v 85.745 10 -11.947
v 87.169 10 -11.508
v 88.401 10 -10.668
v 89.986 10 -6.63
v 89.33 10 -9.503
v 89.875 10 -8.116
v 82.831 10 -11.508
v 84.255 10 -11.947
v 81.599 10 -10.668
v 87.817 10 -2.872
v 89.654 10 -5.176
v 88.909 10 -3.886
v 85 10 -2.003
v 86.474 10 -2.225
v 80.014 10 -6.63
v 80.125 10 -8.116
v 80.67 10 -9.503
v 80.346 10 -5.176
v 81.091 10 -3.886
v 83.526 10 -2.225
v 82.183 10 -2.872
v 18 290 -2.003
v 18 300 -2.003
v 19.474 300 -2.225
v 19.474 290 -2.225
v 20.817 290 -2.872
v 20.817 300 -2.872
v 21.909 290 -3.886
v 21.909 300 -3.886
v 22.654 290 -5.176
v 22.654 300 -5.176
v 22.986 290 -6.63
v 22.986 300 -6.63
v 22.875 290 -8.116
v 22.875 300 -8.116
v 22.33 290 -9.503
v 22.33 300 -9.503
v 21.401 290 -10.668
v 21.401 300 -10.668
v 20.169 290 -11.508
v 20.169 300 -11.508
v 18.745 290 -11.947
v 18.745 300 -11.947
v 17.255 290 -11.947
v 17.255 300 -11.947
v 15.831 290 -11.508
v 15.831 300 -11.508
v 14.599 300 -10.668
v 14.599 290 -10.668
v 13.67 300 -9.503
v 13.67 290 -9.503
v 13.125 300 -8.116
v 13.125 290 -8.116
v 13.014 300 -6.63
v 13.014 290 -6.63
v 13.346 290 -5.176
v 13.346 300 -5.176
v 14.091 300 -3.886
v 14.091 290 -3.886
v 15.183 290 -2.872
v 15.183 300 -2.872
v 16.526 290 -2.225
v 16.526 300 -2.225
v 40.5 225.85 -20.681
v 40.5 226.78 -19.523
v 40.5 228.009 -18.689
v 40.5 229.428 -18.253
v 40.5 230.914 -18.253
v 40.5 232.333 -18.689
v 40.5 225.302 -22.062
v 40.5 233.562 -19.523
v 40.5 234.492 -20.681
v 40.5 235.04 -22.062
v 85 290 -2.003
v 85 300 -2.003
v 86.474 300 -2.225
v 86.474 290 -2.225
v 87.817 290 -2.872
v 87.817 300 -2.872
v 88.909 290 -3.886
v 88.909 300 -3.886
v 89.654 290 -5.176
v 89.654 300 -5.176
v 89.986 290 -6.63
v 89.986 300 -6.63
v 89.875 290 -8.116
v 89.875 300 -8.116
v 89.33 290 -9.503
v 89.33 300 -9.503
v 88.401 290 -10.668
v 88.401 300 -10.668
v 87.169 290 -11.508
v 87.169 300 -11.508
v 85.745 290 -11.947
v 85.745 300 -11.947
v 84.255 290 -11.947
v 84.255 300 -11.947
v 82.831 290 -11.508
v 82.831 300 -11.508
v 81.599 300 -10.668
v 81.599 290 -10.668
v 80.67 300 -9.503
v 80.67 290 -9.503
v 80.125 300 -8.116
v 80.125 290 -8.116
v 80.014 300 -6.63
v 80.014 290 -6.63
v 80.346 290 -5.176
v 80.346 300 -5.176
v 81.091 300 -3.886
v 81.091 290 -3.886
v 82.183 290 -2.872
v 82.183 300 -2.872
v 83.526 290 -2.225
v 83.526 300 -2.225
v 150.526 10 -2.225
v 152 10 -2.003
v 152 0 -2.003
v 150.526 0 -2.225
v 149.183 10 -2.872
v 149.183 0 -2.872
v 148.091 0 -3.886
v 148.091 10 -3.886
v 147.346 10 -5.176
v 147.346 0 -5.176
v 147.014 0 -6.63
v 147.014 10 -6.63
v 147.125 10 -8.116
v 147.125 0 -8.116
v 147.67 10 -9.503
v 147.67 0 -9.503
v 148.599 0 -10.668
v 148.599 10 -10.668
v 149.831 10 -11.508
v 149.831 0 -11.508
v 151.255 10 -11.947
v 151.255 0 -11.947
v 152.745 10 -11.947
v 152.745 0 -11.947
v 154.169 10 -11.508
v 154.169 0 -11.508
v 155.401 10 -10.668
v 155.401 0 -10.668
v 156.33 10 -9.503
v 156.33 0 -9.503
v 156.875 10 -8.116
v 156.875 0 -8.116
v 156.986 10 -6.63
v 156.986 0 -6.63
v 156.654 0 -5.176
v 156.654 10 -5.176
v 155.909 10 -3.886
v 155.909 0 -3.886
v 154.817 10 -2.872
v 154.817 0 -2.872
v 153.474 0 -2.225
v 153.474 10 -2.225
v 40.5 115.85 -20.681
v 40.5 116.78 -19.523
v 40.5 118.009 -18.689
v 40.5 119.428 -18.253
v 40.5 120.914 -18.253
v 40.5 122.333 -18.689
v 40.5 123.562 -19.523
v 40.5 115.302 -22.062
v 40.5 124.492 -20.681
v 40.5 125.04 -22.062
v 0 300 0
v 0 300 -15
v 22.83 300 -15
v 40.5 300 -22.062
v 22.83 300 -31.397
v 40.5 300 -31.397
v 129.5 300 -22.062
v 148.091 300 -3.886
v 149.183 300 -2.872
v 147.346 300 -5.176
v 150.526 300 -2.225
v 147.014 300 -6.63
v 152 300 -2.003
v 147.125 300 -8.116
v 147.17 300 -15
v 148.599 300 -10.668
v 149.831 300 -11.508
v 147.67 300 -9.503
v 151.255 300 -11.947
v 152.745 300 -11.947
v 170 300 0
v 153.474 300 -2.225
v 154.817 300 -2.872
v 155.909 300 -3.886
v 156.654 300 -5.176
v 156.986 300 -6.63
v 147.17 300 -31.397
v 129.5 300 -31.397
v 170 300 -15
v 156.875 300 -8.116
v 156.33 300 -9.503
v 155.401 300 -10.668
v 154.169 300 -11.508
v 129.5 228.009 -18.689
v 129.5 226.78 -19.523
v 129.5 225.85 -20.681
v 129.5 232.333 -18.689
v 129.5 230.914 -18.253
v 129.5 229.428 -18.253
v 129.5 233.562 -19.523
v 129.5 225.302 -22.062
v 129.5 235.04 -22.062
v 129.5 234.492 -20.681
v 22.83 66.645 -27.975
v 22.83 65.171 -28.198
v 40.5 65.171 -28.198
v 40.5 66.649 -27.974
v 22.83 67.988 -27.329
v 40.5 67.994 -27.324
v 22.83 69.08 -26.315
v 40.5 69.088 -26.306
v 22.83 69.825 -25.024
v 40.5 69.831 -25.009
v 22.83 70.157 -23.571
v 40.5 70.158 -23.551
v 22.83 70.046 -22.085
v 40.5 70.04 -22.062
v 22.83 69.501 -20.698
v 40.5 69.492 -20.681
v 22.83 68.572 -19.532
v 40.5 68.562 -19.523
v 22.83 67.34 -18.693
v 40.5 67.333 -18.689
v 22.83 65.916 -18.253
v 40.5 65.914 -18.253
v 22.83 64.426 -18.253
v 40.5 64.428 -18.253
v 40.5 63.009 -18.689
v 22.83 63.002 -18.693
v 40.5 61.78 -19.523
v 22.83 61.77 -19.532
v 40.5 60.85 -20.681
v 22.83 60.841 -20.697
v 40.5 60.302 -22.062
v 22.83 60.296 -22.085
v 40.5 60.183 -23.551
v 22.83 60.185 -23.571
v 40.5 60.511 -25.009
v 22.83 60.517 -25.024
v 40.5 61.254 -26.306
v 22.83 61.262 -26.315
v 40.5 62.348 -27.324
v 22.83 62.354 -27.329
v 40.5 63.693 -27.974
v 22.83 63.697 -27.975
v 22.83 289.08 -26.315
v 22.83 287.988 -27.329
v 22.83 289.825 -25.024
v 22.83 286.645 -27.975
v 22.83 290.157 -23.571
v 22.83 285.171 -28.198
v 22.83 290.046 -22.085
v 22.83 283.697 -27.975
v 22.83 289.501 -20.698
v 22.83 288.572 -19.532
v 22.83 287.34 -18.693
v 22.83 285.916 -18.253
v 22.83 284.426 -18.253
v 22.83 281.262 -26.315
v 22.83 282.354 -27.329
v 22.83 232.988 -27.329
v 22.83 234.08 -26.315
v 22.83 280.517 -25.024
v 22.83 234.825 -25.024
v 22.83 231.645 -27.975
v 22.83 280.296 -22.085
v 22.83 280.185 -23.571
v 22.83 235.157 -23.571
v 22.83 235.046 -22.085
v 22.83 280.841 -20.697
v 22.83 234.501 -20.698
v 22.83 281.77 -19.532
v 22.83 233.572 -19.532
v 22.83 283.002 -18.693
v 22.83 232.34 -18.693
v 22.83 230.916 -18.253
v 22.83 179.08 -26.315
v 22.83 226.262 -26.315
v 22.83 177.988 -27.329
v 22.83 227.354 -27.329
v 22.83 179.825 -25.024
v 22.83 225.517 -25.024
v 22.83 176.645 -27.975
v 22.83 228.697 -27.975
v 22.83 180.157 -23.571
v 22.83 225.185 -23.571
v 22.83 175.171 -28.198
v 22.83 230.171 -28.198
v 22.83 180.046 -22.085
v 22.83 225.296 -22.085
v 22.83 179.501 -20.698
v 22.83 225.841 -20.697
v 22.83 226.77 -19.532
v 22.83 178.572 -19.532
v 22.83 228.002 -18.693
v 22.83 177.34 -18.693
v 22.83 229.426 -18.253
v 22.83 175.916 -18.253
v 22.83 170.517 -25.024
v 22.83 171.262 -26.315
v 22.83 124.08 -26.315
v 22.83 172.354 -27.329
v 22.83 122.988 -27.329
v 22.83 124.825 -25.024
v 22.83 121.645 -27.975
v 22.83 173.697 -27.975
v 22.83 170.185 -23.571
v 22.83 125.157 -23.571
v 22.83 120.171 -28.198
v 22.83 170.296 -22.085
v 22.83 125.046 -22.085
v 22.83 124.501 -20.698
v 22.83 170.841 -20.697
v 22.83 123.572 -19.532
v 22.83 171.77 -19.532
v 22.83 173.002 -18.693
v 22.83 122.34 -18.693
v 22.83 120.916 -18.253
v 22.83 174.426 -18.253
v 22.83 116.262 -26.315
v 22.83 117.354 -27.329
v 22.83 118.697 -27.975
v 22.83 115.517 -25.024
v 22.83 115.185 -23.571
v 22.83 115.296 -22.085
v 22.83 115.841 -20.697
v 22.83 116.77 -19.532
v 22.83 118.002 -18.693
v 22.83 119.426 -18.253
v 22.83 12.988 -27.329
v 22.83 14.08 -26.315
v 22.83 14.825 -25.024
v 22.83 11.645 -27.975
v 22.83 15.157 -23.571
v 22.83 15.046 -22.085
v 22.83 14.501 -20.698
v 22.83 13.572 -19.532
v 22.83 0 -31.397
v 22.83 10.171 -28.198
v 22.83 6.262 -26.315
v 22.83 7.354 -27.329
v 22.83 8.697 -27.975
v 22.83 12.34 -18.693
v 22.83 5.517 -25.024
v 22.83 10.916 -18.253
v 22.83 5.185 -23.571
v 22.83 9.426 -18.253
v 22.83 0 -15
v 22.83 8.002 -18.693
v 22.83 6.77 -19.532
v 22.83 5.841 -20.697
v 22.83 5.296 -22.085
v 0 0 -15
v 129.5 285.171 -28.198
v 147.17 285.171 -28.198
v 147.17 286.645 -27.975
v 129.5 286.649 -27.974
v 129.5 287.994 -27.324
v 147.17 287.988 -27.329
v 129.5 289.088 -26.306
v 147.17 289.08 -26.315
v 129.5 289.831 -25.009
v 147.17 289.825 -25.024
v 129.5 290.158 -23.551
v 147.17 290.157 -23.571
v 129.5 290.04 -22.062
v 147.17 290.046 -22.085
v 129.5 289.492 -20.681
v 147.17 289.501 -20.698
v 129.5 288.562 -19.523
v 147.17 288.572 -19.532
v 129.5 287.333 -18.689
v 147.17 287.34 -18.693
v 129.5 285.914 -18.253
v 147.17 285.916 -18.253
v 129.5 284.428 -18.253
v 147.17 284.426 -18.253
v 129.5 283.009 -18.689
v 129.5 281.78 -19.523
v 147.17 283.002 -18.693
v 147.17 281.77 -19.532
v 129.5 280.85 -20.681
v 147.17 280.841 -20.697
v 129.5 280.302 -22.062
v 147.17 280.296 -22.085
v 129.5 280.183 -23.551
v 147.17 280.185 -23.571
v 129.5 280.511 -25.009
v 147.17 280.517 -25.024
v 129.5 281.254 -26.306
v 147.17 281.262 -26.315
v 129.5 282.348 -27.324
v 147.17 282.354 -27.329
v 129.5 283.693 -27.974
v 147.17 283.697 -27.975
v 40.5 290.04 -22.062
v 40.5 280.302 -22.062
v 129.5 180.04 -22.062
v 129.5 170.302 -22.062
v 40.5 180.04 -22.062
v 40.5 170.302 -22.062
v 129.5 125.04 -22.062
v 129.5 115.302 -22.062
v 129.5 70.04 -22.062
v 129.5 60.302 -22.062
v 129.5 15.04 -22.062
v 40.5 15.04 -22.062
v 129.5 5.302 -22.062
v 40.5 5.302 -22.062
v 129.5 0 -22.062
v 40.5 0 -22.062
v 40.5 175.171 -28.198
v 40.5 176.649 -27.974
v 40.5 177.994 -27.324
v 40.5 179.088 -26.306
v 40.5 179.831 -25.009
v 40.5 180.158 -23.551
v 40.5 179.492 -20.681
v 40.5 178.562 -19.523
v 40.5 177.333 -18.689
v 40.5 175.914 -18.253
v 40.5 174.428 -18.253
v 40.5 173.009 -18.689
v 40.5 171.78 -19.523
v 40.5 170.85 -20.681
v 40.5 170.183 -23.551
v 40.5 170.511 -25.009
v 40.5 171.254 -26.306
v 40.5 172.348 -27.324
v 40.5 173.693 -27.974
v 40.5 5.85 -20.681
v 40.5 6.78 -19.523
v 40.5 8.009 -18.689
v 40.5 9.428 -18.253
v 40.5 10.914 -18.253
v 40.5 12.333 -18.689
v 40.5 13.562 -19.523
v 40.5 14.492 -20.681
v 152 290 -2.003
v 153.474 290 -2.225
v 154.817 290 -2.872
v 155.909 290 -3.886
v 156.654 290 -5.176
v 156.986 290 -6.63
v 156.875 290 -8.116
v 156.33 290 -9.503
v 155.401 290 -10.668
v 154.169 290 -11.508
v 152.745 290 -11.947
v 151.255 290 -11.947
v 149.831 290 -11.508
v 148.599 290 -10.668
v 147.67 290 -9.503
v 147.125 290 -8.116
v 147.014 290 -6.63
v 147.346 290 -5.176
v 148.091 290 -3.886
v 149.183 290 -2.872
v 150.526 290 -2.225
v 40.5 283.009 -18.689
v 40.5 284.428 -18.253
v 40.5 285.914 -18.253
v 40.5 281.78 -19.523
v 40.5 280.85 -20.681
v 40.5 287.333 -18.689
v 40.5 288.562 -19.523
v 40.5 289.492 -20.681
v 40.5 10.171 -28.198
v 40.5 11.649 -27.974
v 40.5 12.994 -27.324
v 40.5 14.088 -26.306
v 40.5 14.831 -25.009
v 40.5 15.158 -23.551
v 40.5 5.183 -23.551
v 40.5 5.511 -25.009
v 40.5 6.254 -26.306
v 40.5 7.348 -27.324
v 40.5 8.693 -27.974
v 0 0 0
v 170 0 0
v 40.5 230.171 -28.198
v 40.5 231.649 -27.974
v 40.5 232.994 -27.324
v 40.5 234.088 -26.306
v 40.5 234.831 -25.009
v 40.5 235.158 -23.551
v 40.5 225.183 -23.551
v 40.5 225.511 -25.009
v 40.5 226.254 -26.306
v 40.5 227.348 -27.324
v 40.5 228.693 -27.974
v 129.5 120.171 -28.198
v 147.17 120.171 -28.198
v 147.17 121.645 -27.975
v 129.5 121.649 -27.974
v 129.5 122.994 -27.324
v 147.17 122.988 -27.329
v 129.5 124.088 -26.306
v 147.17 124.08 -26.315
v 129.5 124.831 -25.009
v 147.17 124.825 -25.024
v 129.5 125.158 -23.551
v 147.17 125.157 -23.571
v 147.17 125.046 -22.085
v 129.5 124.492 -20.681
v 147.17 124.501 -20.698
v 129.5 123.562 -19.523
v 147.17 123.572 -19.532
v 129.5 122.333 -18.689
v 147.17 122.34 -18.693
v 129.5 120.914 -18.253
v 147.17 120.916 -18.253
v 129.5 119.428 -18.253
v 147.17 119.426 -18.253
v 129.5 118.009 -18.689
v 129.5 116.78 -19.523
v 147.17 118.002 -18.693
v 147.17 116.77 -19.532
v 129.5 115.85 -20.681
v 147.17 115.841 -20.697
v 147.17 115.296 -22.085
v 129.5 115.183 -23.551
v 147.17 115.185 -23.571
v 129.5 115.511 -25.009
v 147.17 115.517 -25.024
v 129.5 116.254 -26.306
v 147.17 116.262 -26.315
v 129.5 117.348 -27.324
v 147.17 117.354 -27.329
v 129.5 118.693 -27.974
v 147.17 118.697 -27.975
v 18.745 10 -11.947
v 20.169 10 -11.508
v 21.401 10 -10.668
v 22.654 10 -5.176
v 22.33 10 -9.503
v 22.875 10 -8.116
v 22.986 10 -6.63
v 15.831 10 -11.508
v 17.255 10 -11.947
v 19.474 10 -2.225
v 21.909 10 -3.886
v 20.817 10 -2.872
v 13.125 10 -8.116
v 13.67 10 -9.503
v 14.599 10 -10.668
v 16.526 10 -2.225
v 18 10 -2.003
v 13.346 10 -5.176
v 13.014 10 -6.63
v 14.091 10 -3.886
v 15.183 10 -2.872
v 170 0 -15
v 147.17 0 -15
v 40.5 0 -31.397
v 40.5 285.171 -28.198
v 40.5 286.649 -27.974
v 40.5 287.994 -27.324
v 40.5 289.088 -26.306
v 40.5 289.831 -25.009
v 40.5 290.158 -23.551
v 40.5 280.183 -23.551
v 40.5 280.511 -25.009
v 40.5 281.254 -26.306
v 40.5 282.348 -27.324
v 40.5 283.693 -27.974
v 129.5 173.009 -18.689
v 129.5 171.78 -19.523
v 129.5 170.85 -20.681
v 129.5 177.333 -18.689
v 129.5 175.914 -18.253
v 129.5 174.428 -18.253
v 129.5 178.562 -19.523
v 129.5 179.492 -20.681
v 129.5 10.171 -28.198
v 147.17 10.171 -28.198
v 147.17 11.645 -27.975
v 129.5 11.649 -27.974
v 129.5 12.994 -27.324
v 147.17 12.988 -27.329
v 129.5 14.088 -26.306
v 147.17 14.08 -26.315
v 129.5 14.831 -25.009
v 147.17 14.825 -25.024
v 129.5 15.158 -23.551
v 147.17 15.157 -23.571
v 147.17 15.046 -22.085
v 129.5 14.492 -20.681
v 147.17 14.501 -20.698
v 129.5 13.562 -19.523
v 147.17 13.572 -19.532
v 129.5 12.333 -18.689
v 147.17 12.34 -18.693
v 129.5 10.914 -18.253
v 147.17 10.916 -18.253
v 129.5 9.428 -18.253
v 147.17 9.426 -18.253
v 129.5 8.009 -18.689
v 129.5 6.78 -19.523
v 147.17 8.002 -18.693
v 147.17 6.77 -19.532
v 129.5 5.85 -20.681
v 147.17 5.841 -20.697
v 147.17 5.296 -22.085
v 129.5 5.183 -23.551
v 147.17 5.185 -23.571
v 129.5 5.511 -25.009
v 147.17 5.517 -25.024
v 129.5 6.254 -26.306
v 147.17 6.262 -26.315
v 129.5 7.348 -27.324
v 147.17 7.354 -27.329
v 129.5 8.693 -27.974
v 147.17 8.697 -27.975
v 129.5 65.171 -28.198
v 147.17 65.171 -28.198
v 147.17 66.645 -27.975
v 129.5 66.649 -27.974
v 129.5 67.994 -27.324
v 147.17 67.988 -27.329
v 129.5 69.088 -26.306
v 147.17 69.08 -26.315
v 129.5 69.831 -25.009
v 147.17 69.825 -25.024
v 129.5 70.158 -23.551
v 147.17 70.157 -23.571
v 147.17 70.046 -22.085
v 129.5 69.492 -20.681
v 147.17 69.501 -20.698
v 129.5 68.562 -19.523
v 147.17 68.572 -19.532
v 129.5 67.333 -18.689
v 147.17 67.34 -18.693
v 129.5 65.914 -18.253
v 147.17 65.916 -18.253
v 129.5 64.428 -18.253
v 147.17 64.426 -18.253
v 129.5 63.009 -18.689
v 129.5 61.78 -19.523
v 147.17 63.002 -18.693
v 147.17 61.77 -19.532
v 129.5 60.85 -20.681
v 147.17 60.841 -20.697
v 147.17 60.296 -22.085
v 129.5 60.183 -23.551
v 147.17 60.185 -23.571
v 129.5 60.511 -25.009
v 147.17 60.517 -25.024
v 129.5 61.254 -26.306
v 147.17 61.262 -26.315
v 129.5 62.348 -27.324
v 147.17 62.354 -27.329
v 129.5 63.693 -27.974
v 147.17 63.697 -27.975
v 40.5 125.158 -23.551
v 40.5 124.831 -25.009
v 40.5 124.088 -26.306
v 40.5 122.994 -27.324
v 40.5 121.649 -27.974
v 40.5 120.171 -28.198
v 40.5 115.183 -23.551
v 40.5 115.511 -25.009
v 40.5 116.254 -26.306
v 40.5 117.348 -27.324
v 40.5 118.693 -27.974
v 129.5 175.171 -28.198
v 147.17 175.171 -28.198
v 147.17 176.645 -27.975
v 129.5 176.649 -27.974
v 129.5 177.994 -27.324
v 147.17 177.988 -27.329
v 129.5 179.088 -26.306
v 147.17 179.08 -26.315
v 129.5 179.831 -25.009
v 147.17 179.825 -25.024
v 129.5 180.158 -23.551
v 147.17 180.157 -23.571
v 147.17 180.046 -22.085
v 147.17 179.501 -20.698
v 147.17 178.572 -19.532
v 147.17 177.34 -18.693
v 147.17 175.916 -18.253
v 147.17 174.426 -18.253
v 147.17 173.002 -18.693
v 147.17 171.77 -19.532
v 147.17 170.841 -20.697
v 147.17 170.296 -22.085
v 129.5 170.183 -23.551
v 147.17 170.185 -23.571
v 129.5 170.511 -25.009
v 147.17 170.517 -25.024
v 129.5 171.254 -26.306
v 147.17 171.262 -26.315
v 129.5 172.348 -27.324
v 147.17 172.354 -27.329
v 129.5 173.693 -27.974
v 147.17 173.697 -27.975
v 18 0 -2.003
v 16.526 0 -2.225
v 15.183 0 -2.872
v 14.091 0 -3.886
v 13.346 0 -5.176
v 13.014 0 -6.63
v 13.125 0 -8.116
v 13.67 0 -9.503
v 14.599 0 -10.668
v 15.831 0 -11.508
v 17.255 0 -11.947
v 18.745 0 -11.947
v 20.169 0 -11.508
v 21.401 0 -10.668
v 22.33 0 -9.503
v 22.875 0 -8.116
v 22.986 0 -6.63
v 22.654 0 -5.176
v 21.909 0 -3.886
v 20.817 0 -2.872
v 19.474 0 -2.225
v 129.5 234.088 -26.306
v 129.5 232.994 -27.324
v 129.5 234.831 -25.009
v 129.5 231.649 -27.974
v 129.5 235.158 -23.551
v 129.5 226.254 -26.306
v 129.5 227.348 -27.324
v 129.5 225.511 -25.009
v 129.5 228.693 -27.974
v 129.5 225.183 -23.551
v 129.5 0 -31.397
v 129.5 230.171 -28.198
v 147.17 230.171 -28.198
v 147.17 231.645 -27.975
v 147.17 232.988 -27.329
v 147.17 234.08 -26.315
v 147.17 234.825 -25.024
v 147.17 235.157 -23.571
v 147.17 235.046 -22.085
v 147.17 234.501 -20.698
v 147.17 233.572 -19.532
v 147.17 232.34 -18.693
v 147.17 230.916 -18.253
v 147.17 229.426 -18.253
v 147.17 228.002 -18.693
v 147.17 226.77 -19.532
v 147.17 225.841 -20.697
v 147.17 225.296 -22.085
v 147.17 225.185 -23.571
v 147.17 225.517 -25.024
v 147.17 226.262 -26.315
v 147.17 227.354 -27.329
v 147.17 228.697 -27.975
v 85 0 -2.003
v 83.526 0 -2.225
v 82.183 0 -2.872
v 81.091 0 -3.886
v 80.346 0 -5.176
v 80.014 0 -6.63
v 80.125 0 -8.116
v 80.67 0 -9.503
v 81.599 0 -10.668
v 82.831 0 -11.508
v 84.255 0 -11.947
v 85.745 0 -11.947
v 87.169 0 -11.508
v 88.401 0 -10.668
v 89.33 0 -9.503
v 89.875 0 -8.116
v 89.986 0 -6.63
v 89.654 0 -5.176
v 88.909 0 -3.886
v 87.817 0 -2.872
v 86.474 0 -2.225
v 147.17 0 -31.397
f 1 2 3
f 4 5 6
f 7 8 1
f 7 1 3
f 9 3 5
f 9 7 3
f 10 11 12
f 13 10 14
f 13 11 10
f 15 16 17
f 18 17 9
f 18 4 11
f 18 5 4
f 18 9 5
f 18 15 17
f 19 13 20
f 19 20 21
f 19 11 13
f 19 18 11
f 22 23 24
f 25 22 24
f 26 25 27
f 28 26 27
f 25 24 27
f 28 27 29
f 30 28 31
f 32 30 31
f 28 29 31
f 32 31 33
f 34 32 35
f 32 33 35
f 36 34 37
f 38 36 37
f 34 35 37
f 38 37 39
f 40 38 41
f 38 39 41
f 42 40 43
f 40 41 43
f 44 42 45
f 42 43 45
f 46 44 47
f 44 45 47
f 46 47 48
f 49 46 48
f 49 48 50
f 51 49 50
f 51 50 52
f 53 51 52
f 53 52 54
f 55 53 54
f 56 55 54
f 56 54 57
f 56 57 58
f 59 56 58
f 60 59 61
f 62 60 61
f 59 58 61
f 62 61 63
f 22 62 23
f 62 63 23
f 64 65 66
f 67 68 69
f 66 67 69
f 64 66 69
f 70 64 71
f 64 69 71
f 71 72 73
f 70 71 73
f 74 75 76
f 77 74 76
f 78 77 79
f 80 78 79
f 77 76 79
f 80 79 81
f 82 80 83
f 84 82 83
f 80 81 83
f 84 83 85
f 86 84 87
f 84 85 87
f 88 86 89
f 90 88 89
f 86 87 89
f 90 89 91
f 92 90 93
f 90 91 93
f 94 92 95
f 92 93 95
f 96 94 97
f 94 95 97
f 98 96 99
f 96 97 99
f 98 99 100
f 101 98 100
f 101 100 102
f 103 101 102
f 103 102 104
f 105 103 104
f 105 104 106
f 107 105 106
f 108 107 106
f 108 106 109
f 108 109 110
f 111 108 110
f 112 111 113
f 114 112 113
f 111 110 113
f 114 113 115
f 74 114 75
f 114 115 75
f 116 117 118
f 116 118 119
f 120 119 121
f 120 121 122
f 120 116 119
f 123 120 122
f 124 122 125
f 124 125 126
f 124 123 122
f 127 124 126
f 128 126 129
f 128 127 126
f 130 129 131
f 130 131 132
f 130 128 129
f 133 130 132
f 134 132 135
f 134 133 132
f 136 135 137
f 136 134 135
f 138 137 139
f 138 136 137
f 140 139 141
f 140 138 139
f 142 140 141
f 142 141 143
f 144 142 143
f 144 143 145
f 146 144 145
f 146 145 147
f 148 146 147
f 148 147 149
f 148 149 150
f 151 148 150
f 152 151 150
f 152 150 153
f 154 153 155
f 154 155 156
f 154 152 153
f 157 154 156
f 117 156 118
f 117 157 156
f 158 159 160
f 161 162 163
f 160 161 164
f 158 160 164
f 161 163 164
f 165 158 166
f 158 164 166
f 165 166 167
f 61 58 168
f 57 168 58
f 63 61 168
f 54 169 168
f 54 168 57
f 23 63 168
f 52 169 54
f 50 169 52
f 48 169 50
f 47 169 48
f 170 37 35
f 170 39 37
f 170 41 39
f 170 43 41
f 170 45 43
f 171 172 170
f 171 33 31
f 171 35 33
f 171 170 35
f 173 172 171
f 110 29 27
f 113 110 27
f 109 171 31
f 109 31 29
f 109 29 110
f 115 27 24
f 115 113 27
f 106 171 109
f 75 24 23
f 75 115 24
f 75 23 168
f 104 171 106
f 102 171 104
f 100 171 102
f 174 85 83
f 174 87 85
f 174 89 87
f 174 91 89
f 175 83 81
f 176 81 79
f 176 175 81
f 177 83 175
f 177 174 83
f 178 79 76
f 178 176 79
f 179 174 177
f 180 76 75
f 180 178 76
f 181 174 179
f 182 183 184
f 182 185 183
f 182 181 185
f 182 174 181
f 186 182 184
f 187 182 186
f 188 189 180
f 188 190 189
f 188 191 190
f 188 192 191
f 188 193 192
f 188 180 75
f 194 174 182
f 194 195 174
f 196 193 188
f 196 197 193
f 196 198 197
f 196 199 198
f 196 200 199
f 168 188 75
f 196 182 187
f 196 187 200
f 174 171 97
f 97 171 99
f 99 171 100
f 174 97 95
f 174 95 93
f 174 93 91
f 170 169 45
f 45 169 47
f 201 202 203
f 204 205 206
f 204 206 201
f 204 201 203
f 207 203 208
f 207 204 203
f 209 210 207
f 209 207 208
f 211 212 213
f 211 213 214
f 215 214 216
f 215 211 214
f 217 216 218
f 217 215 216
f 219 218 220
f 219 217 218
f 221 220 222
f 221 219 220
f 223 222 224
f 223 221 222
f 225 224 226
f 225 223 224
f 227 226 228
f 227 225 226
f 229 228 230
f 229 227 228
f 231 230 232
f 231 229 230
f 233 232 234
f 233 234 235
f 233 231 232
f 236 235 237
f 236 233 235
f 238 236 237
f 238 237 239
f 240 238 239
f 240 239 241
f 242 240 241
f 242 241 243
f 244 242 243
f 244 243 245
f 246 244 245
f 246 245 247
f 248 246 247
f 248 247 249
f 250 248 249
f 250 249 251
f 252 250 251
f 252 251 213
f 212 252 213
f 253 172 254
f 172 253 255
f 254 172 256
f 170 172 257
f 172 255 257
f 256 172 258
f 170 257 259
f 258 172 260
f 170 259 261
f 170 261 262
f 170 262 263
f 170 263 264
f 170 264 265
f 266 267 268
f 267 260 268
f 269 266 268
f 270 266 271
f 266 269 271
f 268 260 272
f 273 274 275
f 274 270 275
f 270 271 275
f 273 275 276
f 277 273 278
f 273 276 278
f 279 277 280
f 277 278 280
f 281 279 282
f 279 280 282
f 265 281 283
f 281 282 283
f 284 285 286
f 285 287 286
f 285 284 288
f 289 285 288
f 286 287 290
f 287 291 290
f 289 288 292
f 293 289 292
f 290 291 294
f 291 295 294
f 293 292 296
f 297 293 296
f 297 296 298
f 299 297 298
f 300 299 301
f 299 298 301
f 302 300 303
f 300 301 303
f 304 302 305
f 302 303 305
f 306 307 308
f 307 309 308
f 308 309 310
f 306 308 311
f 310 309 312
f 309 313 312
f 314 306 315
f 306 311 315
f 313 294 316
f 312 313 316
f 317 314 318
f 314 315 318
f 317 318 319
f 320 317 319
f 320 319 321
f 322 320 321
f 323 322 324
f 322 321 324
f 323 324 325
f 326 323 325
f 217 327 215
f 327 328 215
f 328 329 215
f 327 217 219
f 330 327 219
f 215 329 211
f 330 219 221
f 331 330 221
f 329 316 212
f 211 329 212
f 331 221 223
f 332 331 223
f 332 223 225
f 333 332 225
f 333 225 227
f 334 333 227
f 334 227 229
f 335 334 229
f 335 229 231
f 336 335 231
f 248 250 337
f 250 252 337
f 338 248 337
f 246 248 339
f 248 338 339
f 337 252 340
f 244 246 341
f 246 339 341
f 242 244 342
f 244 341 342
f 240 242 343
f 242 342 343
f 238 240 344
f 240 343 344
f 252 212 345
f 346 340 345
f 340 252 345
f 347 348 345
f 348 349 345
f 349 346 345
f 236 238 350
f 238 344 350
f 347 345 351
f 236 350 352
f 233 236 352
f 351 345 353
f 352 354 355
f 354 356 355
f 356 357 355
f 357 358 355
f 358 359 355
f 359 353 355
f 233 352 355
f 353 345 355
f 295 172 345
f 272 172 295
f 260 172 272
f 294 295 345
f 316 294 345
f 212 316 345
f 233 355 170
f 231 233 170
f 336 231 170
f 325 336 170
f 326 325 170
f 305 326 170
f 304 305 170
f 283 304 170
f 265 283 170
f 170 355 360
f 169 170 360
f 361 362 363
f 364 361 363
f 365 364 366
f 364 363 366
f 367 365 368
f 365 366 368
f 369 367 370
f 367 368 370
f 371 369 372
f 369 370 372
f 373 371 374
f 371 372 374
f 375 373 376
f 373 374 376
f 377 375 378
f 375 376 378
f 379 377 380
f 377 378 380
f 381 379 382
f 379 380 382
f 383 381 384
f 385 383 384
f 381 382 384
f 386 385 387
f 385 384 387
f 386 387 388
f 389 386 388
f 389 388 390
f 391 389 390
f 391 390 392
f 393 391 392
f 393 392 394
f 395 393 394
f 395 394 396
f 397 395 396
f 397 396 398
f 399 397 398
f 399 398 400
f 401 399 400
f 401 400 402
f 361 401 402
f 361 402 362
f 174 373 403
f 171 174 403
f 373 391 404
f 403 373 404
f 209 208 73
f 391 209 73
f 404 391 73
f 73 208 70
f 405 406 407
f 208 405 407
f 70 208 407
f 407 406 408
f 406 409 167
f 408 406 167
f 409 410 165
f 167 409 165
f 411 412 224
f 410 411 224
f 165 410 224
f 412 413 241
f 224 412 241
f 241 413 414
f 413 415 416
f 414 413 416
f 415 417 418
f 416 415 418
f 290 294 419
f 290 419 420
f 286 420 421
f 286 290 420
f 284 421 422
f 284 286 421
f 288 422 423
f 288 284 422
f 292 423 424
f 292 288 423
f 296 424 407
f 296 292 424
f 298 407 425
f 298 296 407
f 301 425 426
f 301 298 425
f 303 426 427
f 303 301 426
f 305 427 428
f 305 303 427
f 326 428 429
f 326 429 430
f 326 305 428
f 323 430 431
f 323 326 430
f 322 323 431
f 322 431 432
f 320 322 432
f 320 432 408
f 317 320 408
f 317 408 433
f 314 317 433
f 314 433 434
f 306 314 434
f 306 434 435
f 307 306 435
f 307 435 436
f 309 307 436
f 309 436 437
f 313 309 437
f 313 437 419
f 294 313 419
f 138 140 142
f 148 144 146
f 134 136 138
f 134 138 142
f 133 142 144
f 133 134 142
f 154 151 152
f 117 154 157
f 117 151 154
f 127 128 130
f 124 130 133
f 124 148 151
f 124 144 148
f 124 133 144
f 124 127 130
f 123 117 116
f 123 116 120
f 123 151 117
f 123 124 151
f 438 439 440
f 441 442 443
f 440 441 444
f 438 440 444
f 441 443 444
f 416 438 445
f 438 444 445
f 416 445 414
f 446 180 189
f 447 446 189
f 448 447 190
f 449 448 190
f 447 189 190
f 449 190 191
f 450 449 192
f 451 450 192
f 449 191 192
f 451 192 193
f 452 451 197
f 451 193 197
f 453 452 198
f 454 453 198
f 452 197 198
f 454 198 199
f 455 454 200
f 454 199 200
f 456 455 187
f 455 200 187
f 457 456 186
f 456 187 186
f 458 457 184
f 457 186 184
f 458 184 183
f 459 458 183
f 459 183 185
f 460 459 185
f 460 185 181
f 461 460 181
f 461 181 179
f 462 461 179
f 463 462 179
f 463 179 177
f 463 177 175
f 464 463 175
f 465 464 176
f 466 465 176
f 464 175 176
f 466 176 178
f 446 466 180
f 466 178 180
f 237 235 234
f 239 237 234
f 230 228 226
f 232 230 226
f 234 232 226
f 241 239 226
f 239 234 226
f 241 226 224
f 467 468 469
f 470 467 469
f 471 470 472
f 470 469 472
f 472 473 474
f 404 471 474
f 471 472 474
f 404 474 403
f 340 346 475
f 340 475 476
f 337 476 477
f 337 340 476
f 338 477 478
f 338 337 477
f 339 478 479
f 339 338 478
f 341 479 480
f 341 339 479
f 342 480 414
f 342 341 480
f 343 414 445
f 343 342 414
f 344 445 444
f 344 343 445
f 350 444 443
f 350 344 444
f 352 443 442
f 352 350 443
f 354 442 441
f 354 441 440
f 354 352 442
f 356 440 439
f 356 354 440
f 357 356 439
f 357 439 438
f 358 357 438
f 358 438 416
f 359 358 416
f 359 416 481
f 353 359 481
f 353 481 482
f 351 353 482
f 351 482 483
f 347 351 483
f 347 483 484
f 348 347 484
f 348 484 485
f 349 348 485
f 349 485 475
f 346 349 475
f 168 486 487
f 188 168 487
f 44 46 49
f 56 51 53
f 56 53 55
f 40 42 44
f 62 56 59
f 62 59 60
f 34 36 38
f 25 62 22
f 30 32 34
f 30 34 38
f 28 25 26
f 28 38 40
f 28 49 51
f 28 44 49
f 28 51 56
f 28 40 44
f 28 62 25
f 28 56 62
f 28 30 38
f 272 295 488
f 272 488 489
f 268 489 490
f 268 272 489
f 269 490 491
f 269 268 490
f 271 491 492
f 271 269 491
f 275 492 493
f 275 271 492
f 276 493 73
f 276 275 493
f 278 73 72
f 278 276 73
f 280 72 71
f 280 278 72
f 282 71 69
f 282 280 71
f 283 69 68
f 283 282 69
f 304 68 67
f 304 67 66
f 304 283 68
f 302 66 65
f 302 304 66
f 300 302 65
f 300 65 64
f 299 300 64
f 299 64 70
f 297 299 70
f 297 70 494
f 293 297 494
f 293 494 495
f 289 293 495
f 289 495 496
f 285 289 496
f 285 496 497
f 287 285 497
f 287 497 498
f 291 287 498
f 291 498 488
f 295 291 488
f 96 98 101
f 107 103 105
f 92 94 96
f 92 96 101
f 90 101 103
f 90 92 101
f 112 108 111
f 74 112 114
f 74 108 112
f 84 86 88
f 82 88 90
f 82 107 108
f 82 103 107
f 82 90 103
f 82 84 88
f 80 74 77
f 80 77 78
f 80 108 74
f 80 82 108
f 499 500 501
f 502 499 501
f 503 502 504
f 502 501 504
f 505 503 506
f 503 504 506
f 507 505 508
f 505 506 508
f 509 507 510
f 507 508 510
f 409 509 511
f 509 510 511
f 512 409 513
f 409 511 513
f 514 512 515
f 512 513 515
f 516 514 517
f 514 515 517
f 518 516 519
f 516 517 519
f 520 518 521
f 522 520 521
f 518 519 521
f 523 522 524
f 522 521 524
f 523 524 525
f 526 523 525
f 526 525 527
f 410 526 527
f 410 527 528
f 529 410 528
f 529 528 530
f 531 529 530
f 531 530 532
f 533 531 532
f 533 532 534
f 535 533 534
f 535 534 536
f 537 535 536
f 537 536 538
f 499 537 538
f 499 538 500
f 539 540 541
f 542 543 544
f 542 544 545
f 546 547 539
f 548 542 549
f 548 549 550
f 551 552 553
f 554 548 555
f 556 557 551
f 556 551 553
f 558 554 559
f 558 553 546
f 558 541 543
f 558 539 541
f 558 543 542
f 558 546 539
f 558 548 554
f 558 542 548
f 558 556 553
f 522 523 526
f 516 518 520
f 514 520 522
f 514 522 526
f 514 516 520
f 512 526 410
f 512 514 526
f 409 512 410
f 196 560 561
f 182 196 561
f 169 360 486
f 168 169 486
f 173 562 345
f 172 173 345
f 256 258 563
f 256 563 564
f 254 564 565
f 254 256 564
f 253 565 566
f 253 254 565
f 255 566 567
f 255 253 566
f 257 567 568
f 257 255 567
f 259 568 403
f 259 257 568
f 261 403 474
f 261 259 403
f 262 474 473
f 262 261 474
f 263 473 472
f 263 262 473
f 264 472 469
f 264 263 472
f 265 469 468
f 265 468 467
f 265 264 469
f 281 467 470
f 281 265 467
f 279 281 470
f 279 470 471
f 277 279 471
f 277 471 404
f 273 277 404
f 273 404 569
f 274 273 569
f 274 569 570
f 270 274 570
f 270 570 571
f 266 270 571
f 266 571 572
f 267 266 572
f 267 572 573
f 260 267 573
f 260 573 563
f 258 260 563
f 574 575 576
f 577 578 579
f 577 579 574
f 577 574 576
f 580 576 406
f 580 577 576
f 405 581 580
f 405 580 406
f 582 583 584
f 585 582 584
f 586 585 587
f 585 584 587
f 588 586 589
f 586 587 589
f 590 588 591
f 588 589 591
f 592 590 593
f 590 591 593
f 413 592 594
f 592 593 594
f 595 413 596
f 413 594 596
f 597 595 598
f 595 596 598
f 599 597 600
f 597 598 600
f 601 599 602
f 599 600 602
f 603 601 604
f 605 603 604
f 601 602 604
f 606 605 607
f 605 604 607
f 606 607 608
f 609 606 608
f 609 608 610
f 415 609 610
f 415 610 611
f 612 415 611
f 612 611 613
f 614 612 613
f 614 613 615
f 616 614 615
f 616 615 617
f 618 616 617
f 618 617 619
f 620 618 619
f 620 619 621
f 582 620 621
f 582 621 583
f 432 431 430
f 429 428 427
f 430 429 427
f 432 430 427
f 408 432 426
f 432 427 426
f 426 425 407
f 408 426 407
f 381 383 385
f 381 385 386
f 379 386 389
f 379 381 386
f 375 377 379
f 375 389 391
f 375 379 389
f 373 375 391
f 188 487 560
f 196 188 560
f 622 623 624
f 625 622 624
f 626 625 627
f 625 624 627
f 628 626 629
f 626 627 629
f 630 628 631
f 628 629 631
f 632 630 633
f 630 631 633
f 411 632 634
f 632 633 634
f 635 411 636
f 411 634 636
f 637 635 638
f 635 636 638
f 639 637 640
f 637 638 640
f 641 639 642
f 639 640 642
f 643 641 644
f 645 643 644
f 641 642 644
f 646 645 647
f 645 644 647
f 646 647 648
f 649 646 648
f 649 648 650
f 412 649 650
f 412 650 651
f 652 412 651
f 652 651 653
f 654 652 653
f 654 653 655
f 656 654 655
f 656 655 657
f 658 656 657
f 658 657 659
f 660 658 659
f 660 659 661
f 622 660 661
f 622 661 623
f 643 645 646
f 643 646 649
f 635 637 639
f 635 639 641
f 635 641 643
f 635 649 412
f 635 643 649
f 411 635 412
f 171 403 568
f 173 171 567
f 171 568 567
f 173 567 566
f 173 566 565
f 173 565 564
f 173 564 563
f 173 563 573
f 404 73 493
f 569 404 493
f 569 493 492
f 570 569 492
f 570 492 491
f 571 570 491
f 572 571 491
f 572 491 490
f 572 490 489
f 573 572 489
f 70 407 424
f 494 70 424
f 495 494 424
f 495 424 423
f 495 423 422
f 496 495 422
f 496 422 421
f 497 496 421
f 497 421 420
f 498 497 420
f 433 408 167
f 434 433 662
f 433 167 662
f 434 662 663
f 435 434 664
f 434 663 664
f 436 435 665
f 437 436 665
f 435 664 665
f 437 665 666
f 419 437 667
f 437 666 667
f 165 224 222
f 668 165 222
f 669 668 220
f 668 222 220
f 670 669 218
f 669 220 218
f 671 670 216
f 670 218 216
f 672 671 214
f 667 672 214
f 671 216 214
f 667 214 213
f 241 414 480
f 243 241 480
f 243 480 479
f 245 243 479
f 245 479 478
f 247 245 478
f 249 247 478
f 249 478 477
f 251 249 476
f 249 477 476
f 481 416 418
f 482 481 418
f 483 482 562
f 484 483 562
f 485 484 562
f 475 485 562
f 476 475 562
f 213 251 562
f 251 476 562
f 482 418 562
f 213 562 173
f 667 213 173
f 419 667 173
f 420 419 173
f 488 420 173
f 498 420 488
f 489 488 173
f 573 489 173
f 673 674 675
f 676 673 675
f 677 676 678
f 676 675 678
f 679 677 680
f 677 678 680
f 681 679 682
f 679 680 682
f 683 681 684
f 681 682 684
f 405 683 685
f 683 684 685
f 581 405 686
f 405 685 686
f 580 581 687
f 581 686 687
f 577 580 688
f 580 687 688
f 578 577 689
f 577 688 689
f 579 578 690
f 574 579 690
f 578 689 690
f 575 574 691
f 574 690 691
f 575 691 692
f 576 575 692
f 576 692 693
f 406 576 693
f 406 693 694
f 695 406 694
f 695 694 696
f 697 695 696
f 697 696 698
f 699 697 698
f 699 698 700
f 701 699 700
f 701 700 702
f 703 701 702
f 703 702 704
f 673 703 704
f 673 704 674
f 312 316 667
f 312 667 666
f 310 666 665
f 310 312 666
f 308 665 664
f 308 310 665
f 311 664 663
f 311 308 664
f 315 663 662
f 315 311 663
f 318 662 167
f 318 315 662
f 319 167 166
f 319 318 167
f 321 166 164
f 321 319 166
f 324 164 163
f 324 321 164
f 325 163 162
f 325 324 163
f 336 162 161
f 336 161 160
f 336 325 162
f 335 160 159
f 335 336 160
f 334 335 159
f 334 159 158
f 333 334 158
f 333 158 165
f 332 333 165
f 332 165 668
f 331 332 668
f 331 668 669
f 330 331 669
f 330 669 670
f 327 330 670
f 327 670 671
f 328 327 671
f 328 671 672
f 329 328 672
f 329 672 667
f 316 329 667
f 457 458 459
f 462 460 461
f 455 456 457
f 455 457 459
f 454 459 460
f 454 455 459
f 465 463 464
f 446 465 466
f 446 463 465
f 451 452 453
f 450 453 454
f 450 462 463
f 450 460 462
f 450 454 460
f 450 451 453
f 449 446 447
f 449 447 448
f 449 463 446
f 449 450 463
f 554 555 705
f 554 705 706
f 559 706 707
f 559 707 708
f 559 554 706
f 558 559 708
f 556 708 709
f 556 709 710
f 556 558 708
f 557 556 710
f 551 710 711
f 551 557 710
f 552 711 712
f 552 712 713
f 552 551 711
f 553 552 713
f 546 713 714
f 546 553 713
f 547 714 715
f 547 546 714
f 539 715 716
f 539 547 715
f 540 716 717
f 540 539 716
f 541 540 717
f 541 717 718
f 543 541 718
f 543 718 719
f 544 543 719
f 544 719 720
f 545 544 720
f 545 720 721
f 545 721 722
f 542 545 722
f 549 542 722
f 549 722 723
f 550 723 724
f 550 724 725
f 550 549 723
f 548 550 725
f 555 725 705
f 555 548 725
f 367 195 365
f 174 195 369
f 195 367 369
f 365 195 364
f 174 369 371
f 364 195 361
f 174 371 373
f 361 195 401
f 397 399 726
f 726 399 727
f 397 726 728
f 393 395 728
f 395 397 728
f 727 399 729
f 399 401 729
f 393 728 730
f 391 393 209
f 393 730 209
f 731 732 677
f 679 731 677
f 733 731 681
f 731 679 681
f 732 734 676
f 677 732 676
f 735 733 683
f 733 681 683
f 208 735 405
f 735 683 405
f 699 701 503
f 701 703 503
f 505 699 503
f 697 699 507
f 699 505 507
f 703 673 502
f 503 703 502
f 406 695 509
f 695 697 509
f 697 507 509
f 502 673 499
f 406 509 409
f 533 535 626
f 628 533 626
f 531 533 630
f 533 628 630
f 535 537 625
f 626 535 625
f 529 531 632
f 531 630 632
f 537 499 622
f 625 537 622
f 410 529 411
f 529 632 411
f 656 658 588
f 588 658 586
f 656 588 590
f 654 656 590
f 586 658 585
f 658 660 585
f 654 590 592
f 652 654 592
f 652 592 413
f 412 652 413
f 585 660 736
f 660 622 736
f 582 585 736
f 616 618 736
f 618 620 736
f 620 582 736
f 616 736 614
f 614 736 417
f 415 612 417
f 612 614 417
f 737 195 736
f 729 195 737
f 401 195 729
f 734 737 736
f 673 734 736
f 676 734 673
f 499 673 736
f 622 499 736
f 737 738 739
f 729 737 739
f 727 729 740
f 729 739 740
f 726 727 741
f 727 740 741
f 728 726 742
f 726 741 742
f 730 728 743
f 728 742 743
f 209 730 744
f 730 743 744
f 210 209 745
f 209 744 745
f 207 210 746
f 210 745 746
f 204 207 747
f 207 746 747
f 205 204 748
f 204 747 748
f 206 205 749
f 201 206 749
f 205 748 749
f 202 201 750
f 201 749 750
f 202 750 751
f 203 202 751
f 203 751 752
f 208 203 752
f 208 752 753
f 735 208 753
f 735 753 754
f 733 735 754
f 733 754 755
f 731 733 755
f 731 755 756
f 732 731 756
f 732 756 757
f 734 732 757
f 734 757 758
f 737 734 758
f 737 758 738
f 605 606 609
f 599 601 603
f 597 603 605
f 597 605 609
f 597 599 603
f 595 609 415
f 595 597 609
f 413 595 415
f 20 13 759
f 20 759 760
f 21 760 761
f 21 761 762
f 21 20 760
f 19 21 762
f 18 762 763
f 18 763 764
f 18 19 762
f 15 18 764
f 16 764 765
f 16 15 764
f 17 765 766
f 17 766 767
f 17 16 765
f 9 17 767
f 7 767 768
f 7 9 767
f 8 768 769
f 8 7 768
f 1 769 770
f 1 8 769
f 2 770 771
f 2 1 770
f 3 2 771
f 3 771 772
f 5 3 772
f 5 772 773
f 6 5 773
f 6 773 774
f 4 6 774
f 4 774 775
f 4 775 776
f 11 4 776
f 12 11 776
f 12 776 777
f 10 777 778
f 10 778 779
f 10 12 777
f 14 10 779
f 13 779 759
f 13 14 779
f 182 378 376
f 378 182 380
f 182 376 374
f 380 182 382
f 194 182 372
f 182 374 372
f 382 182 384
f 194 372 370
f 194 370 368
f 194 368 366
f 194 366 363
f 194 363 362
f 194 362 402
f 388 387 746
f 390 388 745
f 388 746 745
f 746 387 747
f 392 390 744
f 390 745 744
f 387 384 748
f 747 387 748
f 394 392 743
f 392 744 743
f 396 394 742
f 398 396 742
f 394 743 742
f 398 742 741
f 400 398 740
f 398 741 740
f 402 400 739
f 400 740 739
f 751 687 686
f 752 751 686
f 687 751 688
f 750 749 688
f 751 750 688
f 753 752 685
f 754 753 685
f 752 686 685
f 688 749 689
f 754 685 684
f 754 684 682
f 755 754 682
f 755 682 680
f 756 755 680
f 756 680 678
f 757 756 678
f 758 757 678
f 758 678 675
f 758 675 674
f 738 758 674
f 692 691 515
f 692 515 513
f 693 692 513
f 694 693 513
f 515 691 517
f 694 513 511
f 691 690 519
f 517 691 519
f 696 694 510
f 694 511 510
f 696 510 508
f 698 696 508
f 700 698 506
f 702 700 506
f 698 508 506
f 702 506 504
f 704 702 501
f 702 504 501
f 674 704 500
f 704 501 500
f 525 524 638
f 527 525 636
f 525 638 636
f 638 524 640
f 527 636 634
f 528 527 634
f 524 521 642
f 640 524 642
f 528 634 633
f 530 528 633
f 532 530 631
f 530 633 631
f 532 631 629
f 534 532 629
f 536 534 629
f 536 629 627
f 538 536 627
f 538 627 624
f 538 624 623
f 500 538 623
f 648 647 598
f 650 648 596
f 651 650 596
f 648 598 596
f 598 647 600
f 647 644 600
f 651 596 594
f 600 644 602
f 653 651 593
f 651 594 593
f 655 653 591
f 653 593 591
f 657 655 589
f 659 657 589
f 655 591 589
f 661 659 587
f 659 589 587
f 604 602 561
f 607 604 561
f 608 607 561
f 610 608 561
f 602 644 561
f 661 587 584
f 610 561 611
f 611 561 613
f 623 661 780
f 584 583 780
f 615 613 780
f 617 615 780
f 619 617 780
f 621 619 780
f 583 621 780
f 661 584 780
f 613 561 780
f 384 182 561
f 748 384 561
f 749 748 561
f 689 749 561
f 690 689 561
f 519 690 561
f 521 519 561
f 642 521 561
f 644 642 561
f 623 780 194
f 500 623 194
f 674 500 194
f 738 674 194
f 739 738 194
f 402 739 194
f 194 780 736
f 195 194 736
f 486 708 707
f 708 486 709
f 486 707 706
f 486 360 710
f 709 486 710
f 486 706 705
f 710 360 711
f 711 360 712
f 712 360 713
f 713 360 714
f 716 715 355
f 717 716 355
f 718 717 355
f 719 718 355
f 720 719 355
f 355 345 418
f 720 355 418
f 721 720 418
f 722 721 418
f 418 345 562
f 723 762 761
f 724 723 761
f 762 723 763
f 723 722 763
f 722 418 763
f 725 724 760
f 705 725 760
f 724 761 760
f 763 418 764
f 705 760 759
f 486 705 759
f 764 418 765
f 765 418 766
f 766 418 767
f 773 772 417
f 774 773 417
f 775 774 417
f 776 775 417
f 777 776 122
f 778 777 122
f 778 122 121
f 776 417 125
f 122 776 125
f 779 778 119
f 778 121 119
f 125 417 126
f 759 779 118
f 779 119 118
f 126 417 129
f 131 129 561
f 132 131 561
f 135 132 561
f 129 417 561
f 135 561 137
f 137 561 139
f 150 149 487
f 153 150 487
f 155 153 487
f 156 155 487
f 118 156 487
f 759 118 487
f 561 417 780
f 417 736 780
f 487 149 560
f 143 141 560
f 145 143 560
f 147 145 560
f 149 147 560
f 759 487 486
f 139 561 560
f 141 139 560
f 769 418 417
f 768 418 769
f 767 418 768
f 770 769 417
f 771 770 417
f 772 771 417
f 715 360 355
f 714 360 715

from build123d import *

# Parameters (mm, degrees)
BOSS_EXTRUDE1_DEPTH = 300
SKETCH6_R           = 5
CUT_EXTRUDE2_DEPTH  = 17.67
SKETCH8_R           = 5
CUT_EXTRUDE3_DEPTH  = 10
CUT_EXTRUDE4_START  = -10
SKETCH9_R           = 5
CUT_EXTRUDE4_DEPTH  = 10


with BuildPart() as part:
    # Sketch2 → Boss-Extrude1 (new body)
    with BuildSketch(Plane(origin=(0, 0, 0), x_dir=(1, 0, 0), z_dir=(0, 1, 0))):
        Polygon((0, 0), (170, 0), (170, 15), (147.17, 15), (147.17, 31.396582403), (129.5, 31.396582403), (129.5, 22.061582403), (40.5, 22.061582403), (40.5, 31.396582403), (22.83, 31.396582403), (22.83, 15), (0, 15), align=None)
    extrude(amount=BOSS_EXTRUDE1_DEPTH)

    # Sketch6 → Cut-Extrude2 (cut)
    with BuildSketch(Plane(origin=(147.17, 0, 0), x_dir=(0, 0, -1), z_dir=(1, 0, 0))):
        with Locations((23.1975, 285.170960777)):
            Circle(SKETCH6_R)
        with Locations((23.1975, 230.170960777)):
            Circle(SKETCH6_R)
        with Locations((23.1975, 175.170960777)):
            Circle(SKETCH6_R)
        with Locations((23.1975, 120.170960777)):
            Circle(SKETCH6_R)
        with Locations((23.1975, 65.170960777)):
            Circle(SKETCH6_R)
        with Locations((23.1975, 10.170960777)):
            Circle(SKETCH6_R)
    cut_extrude2 = extrude(amount=-CUT_EXTRUDE2_DEPTH, mode=Mode.SUBTRACT)

    # Mirror1: Cut-Extrude2 across plane
    add(cut_extrude2.mirror(Plane.ZY.offset(-85)), mode=Mode.SUBTRACT)

    # Sketch8 → Cut-Extrude3 (cut)
    with BuildSketch(Plane(origin=(0, 300, 0), x_dir=(1, 0, 0), z_dir=(0, 1, 0))):
        with Locations((152, 7.003164806)):
            Circle(SKETCH8_R)
        with Locations((85, 7.003164806)):
            Circle(SKETCH8_R)
        with Locations((18, 7.003164806)):
            Circle(SKETCH8_R)
    extrude(amount=-CUT_EXTRUDE3_DEPTH, mode=Mode.SUBTRACT)

    # Sketch9 → Cut-Extrude4 (cut)
    with BuildSketch(Plane.XZ.offset(CUT_EXTRUDE4_START)):
        with Locations((18, -7.003164806)):
            Circle(SKETCH9_R)
        with Locations((85, -7.003164806)):
            Circle(SKETCH9_R)
        with Locations((152, -7.003164806)):
            Circle(SKETCH9_R)
    extrude(amount=CUT_EXTRUDE4_DEPTH, mode=Mode.SUBTRACT)


solid = part.part
